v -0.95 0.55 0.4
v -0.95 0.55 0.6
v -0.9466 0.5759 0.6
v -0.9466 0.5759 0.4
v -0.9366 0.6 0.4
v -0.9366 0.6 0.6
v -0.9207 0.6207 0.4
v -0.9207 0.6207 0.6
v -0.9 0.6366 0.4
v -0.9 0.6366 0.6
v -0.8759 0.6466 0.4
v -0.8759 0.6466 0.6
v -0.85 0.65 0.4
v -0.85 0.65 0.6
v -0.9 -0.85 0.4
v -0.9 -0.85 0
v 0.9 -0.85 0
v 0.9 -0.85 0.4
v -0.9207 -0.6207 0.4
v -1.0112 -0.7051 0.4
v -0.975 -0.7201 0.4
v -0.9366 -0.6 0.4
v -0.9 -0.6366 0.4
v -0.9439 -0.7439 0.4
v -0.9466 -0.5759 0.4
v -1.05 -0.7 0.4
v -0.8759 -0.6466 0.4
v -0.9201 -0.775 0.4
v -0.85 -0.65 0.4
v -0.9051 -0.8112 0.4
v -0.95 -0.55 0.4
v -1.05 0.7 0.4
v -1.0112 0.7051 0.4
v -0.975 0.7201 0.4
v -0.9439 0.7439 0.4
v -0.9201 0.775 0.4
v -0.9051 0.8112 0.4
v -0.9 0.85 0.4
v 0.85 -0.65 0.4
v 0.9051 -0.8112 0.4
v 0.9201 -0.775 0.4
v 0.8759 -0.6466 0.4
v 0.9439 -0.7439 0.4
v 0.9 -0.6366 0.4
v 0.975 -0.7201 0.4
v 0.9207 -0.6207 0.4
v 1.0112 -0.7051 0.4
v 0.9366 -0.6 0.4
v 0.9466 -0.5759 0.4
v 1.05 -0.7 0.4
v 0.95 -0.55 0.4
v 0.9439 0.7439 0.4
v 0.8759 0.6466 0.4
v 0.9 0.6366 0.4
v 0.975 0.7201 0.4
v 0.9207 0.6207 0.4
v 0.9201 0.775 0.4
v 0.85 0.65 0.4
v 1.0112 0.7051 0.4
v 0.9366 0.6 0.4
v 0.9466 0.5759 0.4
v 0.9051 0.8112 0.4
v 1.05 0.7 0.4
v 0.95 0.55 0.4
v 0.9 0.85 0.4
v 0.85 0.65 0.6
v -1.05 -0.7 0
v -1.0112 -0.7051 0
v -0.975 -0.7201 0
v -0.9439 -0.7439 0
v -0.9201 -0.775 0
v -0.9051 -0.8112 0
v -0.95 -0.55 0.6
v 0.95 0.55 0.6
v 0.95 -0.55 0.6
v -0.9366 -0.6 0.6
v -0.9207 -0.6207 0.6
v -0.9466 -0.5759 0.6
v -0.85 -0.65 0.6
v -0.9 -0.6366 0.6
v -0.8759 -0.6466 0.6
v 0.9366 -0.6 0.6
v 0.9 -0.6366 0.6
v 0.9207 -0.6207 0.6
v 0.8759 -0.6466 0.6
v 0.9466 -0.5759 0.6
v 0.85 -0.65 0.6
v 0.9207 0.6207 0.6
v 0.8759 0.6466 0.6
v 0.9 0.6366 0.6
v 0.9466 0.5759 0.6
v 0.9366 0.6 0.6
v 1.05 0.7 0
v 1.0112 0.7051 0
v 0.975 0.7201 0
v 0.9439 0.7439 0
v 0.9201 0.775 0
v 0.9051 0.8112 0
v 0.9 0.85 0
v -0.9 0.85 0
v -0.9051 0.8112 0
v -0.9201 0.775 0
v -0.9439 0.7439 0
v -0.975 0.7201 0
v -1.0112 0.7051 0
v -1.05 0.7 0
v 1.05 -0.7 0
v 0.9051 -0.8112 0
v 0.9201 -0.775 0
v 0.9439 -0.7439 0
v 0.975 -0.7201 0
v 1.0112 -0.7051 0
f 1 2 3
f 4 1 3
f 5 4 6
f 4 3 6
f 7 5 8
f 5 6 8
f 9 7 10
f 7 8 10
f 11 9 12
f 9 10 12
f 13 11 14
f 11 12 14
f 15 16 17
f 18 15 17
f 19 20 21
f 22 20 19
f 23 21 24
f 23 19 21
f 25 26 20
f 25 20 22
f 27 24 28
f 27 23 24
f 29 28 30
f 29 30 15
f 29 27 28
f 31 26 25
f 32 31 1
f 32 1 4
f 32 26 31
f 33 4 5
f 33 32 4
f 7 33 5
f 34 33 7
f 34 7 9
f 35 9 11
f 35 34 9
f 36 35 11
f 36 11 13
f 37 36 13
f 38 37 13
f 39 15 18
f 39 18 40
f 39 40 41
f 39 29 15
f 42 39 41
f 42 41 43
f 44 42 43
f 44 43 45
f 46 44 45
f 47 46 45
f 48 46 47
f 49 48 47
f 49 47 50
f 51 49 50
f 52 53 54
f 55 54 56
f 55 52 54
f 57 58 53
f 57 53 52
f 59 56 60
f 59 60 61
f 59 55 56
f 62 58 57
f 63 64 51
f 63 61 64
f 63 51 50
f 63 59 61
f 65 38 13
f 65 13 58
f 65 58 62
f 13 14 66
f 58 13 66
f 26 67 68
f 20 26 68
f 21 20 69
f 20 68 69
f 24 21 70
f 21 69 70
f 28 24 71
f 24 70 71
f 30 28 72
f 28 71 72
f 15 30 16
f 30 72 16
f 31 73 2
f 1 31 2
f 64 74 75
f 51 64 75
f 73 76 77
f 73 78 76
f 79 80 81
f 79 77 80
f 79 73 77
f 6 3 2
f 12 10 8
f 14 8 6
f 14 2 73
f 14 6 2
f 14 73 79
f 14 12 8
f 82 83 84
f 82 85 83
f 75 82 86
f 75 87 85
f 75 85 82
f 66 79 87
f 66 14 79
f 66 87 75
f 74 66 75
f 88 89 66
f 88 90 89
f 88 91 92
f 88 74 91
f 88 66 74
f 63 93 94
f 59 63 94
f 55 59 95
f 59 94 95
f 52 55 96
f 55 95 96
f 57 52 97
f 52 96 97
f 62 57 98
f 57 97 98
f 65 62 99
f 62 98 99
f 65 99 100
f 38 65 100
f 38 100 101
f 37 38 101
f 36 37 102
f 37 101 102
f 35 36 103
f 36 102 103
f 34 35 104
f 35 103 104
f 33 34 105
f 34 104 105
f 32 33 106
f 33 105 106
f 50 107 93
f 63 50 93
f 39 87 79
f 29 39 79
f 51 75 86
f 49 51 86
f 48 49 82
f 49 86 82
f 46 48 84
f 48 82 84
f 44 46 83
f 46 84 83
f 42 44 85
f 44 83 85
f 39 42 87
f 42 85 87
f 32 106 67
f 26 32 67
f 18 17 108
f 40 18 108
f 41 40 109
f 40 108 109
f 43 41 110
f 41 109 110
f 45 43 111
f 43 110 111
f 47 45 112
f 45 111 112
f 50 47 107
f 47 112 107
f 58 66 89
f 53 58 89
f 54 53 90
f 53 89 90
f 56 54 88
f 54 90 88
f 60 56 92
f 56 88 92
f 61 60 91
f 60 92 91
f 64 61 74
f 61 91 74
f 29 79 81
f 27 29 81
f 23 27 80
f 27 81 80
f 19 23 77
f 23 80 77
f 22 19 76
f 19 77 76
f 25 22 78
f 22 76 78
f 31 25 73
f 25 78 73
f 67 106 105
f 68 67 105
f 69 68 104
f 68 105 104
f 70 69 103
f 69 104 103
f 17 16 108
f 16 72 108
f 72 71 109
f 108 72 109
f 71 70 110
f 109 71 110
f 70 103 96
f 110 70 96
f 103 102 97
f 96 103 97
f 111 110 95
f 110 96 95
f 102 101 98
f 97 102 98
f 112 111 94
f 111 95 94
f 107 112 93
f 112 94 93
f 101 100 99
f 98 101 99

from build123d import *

# Parameters (mm, degrees)
F1_DEPTH = 0.6
F2_W     = 3.739622
F2_H     = 2.95654
F3_DEPTH = 0.2


with BuildPart() as f1:
    # F0 (on Top) → F1 (new body)
    with BuildSketch(Plane.XY):
        with BuildLine():
            Line((-0.9, -0.85), (0.9, -0.85))
            ThreePointArc((0.9, -0.85), (0.943934, -0.743934), (1.05, -0.7))
            Line((1.05, -0.7), (1.05, 0.7))
            ThreePointArc((1.05, 0.7), (0.943934, 0.743934), (0.9, 0.85))
            Line((0.9, 0.85), (-0.9, 0.85))
            ThreePointArc((-0.9, 0.85), (-0.943934, 0.743934), (-1.05, 0.7))
            Line((-1.05, 0.7), (-1.05, -0.7))
            ThreePointArc((-1.05, -0.7), (-0.943934, -0.743934), (-0.9, -0.85))
        make_face()
    extrude(amount=F1_DEPTH)


with BuildPart() as f3:
    # F2 (on face) → F3 (new body)
    with BuildSketch(Plane.XY.offset(0.6)):
        Rectangle(F2_W, F2_H)
        with BuildLine():
            ThreePointArc((0.95, -0.55), (0.920711, -0.620711), (0.85, -0.65))
            Line((0.85, -0.65), (-0.85, -0.65))
            ThreePointArc((-0.85, -0.65), (-0.920711, -0.620711), (-0.95, -0.55))
            Line((-0.95, -0.55), (-0.95, 0.55))
            ThreePointArc((-0.95, 0.55), (-0.920711, 0.620711), (-0.85, 0.65))
            Line((-0.85, 0.65), (0.85, 0.65))
            ThreePointArc((0.85, 0.65), (0.920711, 0.620711), (0.95, 0.55))
            Line((0.95, 0.55), (0.95, -0.55))
        make_face(mode=Mode.SUBTRACT)
    extrude(amount=-F3_DEPTH)


with BuildPart() as f1_1:
    add(f1.part)

    # F4: cut F3
    add(f3.part, mode=Mode.SUBTRACT)


solid = f1_1.part
